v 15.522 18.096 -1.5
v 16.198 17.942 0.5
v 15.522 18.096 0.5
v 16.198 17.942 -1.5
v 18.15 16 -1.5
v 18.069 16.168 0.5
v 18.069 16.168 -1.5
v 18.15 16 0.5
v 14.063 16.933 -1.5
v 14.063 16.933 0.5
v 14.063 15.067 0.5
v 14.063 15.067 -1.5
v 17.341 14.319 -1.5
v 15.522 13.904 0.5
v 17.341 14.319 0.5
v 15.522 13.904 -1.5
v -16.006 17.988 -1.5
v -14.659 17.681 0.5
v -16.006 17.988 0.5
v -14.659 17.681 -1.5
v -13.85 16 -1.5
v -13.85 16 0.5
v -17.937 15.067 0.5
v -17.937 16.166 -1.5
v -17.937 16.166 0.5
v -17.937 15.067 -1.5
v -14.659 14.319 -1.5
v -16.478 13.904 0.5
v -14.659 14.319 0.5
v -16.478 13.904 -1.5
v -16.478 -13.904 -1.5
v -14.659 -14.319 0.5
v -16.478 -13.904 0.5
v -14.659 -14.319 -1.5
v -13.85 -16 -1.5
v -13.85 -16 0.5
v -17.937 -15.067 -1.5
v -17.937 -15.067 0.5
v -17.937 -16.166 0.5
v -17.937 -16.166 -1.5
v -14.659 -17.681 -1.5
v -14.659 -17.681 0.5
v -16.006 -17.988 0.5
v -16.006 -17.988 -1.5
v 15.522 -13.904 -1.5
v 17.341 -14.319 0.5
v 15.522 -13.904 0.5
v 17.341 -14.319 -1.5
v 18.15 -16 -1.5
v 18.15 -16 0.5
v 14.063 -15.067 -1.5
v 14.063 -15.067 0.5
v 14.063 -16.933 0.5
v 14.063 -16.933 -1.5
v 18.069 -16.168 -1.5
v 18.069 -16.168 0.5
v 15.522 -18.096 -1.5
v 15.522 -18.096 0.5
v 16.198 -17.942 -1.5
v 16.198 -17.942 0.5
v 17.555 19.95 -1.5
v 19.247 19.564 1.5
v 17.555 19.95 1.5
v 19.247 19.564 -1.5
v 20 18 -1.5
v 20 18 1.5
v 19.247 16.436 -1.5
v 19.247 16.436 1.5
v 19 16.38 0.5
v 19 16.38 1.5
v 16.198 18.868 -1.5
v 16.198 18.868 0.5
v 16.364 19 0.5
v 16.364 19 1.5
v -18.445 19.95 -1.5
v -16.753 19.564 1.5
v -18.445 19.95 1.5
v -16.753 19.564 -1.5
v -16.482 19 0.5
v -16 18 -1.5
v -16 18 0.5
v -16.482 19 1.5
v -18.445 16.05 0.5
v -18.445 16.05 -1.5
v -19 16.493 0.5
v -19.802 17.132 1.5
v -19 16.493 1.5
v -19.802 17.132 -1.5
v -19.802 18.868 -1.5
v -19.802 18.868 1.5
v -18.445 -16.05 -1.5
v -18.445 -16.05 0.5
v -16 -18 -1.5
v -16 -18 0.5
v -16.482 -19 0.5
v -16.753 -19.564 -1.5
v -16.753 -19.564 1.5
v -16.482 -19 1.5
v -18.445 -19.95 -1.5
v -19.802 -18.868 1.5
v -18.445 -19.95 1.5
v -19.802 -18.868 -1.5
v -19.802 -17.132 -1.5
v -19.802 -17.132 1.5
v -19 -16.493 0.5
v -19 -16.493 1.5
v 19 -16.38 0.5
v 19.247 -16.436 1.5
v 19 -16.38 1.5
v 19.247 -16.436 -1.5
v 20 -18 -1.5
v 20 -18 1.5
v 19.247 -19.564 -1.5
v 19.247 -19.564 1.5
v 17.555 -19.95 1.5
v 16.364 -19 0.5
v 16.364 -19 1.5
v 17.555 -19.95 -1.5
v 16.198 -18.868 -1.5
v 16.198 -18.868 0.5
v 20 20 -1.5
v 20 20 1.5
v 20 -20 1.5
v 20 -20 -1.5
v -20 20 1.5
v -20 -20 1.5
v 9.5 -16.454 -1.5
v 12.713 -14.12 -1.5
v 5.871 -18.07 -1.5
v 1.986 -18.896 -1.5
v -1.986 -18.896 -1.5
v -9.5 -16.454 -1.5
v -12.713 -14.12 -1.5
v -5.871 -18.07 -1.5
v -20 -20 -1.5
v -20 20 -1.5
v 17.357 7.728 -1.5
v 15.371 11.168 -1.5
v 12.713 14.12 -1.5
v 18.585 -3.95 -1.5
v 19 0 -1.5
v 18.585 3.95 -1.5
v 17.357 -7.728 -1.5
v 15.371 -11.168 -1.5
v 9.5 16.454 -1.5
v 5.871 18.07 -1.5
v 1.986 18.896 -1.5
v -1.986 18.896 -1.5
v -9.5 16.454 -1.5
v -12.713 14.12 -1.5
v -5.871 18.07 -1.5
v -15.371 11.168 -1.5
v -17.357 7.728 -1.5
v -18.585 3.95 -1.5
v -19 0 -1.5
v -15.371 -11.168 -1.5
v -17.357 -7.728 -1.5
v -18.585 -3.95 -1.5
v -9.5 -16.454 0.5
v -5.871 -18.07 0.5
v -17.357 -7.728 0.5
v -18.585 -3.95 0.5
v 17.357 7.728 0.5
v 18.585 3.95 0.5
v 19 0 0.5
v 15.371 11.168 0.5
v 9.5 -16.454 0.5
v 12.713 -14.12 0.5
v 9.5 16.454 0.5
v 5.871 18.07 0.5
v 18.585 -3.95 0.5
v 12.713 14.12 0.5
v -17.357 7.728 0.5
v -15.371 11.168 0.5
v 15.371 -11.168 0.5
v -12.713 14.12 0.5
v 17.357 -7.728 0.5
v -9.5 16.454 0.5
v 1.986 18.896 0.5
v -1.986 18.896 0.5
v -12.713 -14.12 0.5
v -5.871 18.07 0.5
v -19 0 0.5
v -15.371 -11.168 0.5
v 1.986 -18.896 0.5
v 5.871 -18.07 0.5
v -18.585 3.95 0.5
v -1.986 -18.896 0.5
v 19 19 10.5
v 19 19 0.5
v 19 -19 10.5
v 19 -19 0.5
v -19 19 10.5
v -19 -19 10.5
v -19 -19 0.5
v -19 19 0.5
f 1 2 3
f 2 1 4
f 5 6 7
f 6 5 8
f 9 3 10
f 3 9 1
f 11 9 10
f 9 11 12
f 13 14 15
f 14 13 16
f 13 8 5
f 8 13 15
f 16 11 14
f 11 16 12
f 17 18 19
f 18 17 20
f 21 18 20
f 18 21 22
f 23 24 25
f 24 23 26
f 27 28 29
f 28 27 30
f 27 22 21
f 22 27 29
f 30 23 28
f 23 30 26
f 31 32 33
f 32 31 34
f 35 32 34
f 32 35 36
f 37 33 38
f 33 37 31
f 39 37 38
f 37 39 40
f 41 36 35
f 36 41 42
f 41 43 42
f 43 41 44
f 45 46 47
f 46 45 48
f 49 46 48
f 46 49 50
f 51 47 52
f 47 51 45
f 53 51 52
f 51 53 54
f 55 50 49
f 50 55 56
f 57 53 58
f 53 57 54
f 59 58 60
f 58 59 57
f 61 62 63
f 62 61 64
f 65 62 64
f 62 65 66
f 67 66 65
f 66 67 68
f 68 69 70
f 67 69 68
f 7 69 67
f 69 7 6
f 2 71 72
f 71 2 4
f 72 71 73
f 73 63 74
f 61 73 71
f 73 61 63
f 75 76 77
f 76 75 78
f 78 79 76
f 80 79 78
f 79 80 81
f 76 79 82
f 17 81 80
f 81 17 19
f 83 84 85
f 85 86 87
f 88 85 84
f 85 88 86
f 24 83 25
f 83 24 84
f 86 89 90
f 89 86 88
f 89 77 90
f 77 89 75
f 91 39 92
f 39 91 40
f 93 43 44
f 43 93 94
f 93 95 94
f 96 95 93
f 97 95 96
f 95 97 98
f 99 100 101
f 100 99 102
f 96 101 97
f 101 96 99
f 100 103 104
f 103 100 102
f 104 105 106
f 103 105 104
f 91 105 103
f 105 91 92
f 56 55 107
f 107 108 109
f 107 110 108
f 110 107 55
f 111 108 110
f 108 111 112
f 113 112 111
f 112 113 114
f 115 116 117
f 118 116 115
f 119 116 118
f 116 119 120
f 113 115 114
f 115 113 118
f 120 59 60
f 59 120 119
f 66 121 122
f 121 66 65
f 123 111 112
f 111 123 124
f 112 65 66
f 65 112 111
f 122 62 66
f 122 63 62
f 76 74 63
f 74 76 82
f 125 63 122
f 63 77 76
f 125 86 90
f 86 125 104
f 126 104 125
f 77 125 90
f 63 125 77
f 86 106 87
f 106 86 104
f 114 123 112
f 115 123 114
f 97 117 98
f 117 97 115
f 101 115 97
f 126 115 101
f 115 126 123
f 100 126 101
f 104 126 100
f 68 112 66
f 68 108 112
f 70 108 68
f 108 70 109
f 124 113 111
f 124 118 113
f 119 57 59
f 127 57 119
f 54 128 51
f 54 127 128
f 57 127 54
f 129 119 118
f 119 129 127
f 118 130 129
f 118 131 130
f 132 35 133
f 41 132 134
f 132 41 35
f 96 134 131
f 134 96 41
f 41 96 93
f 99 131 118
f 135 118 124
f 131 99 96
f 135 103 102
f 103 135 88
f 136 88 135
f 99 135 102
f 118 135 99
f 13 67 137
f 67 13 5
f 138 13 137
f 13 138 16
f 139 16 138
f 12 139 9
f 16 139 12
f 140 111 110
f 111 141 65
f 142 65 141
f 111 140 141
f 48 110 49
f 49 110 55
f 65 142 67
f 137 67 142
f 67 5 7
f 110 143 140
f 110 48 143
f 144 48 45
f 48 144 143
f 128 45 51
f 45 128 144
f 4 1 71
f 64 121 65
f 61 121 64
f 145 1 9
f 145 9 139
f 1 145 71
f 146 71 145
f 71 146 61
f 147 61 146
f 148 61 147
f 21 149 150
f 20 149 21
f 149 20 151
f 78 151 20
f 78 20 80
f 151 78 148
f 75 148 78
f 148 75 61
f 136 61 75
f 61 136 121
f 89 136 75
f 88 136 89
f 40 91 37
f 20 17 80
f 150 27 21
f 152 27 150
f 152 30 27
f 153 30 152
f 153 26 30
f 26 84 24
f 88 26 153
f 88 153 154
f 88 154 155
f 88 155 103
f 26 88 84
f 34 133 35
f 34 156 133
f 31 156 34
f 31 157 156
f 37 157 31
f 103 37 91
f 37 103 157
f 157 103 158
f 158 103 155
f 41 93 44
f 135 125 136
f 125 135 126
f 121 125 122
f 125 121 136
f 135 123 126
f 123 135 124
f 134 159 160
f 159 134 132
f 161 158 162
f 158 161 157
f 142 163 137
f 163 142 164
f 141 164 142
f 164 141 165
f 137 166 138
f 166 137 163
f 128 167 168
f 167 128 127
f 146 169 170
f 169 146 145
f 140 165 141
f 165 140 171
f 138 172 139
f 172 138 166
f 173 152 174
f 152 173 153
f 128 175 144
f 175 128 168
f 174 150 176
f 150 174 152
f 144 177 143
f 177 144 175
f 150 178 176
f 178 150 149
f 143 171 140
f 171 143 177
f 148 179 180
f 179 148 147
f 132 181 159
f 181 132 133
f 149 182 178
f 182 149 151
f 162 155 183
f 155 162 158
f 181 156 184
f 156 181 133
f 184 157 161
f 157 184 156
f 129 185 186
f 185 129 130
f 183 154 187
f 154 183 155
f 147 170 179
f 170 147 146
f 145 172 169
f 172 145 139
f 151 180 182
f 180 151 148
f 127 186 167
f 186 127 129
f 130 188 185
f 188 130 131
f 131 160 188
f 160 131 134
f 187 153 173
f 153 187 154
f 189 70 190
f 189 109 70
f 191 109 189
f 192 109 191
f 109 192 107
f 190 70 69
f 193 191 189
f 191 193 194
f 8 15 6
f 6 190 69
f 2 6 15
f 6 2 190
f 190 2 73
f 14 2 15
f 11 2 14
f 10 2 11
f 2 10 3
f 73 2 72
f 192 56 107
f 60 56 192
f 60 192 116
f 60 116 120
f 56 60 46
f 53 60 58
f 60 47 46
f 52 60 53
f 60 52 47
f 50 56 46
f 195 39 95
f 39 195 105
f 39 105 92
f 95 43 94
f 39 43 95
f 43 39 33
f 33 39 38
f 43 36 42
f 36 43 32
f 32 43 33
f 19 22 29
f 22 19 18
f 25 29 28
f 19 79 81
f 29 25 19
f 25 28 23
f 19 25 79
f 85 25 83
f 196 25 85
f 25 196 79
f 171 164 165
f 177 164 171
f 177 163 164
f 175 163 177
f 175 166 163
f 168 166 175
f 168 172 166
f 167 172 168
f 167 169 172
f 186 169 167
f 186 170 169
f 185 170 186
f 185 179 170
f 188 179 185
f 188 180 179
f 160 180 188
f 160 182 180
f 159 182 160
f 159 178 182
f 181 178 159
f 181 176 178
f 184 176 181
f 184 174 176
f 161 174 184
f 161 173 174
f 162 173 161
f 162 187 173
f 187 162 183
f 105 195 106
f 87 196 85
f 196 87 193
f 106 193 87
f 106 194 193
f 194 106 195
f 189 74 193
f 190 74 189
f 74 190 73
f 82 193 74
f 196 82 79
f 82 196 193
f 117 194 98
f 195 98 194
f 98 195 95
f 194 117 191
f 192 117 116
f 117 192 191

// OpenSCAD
// Parameters
total_length = 40; //[20:80:1]
plate_thickness = 3; //[1.5:6:0.5]
hole_pitch = 32; //[16:64:0.5]
mount_hole_diameter = 4.3; //[2.5:8:0.1]
aperture_diameter = 38; //[20:78:0.5]
corner_radius = 2; //[0:8:0.5]
fan_depth = 10; //[5:25:1]
fan_frame_margin = 1; //[0.5:3:0.5]
overlap = 1; //[0.5:2:0.5]

// Base Shapes
module mount_plate() {
  cube([total_length, total_length, plate_thickness], center=true);
}

module central_airflow_aperture() {
  cylinder(r=aperture_diameter/2, h=plate_thickness + 2*overlap, center=true);
}

module mount_hole_cyl() {
  cylinder(r=mount_hole_diameter/2, h=plate_thickness + 2*overlap, center=true);
}

module corner_cutout() {
  cylinder(r=corner_radius, h=plate_thickness + 2*overlap, center=true);
}

module fan() {
  cube([total_length - 2*fan_frame_margin, total_length - 2*fan_frame_margin, fan_depth], center=true);
}

// Operations
module four_corner_mounting_holes() {
  union() {
    translate([hole_pitch/2, hole_pitch/2, 0]) mount_hole_cyl();
    translate([-hole_pitch/2, hole_pitch/2, 0]) mount_hole_cyl();
    translate([-hole_pitch/2, -hole_pitch/2, 0]) mount_hole_cyl();
    translate([hole_pitch/2, -hole_pitch/2, 0]) mount_hole_cyl();
  }
}

module corner() {
  union() {
    translate([total_length/2 - corner_radius, total_length/2 - corner_radius, 0]) corner_cutout();
    translate([-(total_length/2 - corner_radius), total_length/2 - corner_radius, 0]) corner_cutout();
    translate([-(total_length/2 - corner_radius), -(total_length/2 - corner_radius), 0]) corner_cutout();
    translate([total_length/2 - corner_radius, -(total_length/2 - corner_radius), 0]) corner_cutout();
  }
}

module plate_with_holes() {
  difference() {
    mount_plate();
    central_airflow_aperture();
    four_corner_mounting_holes();
    corner();
  }
}

module final_union() {
  union() {
    plate_with_holes();
    translate([0, 0, plate_thickness/2 + fan_depth/2 - overlap]) fan();
  }
}

// Final Output
final_union();
